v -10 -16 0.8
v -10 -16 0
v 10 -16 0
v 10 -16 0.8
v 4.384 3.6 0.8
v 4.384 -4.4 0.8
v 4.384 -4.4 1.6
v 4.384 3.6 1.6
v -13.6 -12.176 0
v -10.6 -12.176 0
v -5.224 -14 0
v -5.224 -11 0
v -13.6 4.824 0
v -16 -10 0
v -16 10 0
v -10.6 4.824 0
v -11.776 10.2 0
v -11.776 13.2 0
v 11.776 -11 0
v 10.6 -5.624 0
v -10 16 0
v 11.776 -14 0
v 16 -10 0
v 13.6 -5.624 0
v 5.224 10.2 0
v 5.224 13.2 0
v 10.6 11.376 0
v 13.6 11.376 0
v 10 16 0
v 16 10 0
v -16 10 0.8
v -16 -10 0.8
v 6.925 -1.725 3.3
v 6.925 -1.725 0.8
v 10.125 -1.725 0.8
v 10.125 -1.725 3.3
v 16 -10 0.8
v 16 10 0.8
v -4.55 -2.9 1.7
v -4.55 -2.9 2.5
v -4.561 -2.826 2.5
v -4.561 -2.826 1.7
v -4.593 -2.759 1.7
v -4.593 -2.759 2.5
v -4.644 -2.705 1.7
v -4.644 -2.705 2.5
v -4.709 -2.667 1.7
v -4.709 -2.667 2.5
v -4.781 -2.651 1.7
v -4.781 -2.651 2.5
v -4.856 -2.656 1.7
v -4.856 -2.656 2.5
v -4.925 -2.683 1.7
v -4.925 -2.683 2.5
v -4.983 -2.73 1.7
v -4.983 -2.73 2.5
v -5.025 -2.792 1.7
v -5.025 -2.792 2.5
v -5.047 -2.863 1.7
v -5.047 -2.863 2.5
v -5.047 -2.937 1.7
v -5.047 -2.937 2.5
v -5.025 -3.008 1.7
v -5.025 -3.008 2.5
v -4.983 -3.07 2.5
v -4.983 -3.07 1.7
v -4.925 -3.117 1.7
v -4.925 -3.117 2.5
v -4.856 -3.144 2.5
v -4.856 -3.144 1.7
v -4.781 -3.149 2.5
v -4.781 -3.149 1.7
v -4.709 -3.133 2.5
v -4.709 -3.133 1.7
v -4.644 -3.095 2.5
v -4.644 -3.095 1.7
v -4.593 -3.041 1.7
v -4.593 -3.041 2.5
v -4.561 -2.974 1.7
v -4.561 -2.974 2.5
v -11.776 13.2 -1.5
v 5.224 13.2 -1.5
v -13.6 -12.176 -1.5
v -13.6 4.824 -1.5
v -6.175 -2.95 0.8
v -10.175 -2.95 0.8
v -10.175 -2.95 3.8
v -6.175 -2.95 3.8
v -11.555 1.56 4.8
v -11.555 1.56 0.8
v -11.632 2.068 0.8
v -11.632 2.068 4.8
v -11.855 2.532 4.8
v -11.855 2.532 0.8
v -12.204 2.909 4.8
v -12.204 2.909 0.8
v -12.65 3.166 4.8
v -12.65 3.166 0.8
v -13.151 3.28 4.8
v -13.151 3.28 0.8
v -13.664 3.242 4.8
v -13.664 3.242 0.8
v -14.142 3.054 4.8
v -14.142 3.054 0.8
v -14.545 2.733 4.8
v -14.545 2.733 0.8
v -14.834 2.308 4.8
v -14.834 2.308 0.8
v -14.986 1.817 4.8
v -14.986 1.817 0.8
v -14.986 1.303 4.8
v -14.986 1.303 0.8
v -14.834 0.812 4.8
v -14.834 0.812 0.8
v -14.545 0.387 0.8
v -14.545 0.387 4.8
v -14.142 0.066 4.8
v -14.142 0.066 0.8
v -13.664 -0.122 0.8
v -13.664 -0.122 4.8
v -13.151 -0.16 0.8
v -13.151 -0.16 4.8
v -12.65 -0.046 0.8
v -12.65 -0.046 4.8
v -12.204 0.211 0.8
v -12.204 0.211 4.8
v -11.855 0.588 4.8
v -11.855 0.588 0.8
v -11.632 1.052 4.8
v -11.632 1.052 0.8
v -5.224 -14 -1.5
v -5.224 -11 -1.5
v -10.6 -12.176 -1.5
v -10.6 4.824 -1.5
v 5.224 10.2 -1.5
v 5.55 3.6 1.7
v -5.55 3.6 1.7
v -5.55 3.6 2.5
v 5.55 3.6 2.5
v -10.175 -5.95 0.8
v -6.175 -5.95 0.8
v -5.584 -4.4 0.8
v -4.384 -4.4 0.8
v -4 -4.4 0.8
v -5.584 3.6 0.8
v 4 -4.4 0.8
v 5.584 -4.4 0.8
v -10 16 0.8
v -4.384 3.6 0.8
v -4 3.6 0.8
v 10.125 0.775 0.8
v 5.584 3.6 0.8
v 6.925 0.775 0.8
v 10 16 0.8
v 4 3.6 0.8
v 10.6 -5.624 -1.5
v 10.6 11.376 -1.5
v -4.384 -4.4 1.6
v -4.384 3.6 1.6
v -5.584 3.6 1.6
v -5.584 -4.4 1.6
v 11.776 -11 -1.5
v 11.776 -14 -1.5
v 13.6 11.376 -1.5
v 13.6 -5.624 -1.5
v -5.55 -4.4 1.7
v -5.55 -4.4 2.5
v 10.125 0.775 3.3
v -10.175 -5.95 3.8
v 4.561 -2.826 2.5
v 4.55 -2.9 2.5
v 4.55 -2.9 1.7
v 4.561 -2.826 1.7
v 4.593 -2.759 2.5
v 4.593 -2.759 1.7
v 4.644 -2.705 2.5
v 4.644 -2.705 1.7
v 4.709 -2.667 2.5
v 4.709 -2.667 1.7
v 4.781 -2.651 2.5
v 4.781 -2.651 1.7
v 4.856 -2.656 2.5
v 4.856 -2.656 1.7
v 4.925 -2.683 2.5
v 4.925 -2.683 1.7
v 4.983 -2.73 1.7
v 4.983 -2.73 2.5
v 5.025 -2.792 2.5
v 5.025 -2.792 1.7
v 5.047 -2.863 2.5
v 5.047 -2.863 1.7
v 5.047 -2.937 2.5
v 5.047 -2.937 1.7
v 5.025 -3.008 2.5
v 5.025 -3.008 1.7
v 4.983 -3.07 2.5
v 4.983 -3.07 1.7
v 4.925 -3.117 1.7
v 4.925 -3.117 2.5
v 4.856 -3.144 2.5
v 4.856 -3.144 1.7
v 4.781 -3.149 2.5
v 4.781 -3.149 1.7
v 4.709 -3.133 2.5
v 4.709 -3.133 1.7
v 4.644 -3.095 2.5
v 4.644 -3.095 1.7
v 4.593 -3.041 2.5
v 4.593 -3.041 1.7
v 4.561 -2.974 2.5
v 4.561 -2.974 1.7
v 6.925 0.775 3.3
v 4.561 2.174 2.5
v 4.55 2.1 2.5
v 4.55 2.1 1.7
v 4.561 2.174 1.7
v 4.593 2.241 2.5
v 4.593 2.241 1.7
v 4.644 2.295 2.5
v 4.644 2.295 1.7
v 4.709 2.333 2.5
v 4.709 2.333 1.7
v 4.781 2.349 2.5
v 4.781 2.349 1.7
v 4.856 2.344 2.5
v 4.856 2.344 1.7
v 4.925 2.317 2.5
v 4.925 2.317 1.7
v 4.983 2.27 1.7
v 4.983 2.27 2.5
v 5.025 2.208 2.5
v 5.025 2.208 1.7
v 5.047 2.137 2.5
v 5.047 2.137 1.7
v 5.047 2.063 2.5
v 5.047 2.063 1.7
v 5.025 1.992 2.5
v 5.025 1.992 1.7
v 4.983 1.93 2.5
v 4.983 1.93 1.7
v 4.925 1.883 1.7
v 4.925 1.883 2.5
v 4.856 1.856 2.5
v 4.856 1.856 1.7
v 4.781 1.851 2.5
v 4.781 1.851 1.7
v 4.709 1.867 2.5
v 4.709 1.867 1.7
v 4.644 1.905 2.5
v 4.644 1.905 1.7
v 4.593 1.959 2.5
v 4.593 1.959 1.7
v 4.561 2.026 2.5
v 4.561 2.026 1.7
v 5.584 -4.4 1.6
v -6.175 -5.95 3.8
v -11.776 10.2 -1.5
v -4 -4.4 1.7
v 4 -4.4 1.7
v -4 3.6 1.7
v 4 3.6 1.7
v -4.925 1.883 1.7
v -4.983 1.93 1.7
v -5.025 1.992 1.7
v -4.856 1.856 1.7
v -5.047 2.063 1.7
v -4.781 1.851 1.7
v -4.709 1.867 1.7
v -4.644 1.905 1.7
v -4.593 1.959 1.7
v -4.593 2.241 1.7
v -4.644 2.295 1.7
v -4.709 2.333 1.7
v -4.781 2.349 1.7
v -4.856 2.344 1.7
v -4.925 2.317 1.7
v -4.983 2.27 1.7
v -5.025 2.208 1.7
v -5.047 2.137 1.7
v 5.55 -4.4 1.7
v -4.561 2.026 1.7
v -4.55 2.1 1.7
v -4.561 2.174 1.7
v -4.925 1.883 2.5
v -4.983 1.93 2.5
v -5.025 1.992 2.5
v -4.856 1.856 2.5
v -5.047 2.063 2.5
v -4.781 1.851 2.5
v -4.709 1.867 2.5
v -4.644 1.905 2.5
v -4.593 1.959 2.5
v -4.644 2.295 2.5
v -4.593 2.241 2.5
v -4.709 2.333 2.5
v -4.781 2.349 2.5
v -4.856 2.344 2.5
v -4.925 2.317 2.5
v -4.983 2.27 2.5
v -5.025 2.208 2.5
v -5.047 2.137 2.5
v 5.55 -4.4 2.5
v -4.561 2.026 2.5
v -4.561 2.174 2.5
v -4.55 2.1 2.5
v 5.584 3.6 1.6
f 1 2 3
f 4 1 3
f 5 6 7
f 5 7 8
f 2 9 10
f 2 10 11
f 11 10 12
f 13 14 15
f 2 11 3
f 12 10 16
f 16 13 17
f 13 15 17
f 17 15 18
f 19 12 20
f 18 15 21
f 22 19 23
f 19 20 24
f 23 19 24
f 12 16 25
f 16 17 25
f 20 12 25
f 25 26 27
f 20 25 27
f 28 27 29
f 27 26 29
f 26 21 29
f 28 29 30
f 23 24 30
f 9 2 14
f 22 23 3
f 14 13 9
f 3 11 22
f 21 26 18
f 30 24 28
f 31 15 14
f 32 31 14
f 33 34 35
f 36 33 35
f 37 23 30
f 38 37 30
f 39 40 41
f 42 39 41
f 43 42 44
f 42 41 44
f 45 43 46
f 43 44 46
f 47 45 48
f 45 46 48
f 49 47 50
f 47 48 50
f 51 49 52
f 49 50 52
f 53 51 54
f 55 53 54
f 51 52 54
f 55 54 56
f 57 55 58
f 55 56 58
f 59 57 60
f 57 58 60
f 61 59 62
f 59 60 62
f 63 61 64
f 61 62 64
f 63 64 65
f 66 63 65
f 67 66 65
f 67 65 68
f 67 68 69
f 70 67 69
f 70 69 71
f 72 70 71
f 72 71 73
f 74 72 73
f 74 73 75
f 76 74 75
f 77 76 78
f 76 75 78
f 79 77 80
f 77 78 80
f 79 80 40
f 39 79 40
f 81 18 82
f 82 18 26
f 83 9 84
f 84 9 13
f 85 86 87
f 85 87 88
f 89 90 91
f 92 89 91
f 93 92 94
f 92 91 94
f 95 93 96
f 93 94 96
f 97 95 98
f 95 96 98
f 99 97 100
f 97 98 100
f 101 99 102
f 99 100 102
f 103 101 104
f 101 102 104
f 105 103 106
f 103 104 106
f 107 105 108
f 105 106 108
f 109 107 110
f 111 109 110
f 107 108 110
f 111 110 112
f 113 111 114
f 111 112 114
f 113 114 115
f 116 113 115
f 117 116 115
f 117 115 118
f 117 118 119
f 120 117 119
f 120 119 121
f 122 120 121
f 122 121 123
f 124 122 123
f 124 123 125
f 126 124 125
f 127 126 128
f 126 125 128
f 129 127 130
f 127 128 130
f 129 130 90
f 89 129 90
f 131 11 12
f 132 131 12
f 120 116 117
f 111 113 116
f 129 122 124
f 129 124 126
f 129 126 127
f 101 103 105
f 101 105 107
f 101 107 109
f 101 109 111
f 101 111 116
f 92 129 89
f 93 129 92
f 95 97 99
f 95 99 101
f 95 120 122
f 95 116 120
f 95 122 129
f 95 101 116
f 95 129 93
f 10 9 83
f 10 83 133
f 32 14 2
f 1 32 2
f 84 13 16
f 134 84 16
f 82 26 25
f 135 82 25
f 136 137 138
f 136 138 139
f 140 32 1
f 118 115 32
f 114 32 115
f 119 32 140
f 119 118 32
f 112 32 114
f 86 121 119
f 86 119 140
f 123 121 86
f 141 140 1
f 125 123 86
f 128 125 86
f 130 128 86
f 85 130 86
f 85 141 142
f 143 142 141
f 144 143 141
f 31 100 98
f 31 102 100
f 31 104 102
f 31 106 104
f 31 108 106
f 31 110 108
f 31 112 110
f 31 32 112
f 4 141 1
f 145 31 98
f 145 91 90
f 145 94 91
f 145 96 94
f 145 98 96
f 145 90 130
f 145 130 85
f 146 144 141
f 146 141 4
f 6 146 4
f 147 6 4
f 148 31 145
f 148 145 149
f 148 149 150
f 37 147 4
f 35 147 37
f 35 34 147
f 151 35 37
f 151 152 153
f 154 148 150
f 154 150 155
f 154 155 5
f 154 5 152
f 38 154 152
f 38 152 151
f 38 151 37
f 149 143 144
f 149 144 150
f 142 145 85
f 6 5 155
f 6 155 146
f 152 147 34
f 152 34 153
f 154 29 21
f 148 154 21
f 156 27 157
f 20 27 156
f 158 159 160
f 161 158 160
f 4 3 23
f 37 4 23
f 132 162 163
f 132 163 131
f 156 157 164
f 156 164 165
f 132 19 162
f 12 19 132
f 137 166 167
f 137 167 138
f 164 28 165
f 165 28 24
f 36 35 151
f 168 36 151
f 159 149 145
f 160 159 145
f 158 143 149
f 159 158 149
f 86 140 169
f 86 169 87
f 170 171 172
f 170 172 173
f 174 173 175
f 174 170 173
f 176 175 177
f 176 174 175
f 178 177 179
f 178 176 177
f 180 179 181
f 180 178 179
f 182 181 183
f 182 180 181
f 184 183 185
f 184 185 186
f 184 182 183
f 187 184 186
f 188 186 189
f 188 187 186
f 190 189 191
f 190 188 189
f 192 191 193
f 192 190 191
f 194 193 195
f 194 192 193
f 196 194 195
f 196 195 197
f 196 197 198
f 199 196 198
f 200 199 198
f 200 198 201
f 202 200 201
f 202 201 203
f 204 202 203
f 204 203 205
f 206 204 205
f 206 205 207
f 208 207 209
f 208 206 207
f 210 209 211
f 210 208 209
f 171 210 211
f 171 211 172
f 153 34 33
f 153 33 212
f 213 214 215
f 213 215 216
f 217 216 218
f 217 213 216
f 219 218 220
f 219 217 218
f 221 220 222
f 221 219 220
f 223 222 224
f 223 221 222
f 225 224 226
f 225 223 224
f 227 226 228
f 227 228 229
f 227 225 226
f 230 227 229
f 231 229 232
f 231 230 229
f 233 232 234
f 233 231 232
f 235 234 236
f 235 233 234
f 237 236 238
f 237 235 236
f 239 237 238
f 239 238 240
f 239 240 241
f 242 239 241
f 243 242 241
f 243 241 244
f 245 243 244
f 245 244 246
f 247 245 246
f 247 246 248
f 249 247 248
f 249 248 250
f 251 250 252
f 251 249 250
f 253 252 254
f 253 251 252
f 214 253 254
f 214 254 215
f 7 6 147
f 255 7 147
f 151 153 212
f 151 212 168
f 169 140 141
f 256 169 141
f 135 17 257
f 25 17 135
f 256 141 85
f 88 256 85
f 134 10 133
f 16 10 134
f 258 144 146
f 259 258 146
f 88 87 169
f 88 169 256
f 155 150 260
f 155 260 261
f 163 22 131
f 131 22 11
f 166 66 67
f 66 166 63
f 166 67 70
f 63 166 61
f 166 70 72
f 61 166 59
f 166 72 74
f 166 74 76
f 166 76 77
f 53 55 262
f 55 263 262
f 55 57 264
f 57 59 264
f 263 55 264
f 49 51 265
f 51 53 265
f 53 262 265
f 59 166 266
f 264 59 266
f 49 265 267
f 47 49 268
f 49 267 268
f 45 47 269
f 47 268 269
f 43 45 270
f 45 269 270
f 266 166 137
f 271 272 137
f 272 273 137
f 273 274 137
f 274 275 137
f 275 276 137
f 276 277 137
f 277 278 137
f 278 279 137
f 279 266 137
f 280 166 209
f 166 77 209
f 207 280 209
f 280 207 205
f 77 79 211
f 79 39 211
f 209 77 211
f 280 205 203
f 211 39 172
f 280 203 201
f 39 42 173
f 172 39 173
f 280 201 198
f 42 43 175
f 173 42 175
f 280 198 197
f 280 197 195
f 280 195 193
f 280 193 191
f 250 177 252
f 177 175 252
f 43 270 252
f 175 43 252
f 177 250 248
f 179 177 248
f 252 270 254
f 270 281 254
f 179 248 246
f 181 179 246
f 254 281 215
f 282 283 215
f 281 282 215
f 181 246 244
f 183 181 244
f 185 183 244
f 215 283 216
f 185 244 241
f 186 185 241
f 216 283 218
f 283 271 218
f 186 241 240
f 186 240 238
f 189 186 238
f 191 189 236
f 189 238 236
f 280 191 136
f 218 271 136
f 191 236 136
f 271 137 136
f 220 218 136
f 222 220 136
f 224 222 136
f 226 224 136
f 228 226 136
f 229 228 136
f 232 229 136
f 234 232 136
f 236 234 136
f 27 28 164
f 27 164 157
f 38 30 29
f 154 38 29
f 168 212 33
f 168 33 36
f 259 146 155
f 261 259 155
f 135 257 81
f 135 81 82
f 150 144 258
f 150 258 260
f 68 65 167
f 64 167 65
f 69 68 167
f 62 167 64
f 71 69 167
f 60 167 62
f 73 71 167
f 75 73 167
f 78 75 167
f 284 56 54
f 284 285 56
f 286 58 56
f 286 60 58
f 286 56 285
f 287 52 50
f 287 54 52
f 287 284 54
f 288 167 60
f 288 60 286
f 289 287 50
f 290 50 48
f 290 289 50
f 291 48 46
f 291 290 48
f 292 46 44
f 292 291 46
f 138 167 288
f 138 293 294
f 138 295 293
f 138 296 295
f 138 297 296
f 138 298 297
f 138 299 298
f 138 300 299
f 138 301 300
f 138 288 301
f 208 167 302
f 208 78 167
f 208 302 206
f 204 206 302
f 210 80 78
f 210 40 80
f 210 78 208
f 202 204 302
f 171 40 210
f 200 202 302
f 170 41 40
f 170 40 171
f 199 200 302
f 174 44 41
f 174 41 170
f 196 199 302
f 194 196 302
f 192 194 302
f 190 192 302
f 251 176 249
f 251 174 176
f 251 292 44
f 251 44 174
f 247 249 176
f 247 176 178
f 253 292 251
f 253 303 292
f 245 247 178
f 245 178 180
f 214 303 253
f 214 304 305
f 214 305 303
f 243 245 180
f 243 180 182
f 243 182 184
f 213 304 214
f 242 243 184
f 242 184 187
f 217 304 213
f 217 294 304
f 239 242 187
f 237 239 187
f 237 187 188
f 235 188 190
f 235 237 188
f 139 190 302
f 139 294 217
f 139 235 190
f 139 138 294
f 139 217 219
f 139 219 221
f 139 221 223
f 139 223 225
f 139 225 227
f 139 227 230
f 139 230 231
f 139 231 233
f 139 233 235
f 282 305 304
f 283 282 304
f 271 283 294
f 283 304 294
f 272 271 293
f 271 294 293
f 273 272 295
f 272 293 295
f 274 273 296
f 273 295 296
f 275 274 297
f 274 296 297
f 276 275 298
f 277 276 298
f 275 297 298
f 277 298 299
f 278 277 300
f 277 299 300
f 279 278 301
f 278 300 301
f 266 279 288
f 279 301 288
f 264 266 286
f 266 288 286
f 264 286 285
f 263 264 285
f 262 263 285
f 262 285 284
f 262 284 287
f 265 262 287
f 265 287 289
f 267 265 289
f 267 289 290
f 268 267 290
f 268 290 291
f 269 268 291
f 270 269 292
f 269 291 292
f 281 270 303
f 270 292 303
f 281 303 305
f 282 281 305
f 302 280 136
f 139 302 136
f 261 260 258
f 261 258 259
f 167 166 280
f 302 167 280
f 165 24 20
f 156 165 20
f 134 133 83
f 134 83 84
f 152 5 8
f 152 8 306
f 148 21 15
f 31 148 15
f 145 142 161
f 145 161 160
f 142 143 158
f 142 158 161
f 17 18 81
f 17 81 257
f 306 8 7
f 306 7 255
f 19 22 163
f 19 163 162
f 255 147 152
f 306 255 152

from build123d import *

# Parameters (mm, degrees)
BOSS_EXTRUDE1_DEPTH  = 0.8
SKETCH2_W            = 17
SKETCH2_H            = 3
BOSS_EXTRUDE2_DEPTH  = 1.5
SKETCH3_W            = 8
SKETCH3_H            = 8
BOSS_EXTRUDE3_DEPTH  = 0.9
CIRPATTERN2_COUNT    = 4
SKETCH5_W            = 1.2
SKETCH5_H            = 8
BOSS_EXTRUDE4_DEPTH  = 0.8
SKETCH6_W            = 11.1
SKETCH6_H            = 8
BOSS_EXTRUDE5_DEPTH  = 0.8
SKETCH10_W           = 3.2
SKETCH10_H           = 2.5
BOSS_EXTRUDE7_DEPTH  = 2.5
SKETCH11_W           = 4
SKETCH11_H           = 3
BOSS_EXTRUDE8_DEPTH  = 3
SKETCH12_R           = 1.725
BOSS_EXTRUDE10_DEPTH = 4
SKETCH14_R           = 0.25
CUT_EXTRUDE1_DEPTH   = 0.8


with BuildPart() as part:
    # Sketch1 → Boss-Extrude1 (new body)
    with BuildSketch(Plane.XY):
        Polygon((-10, 16), (-16, 10), (-16, -10), (-10, -16), (10, -16), (16, -10), (16, 10), (10, 16), align=None)
    extrude(amount=BOSS_EXTRUDE1_DEPTH)

    # Sketch2 → Boss-Extrude2 (add)
    with BuildSketch(Plane(origin=(0, 0, 0), x_dir=(-1, 0, 0), z_dir=(0, 0, -1))):
        with Locations((-3.275675651, -12.5)):
            Rectangle(SKETCH2_W, SKETCH2_H)
    boss_extrude2 = extrude(amount=BOSS_EXTRUDE2_DEPTH)

    # Sketch3 → Boss-Extrude3 (add)
    with BuildSketch(Plane.XY.offset(0.8)):
        with Locations((0, -0.4)):
            Rectangle(SKETCH3_W, SKETCH3_H)
    extrude(amount=BOSS_EXTRUDE3_DEPTH)

    # CirPattern2: Boss-Extrude2 ×4 about axis
    cirpattern2_axis = Axis((0, -0.4, 0), (0, 0, 1))
    for i in range(1, CIRPATTERN2_COUNT):
        add(boss_extrude2.rotate(cirpattern2_axis, i * 360 / CIRPATTERN2_COUNT))

    # Sketch5 → Boss-Extrude4 (add)
    with BuildSketch(Plane.XY.offset(0.8)):
        with Locations((4.983974318, -0.4)):
            Rectangle(SKETCH5_W, SKETCH5_H)
    boss_extrude4 = extrude(amount=BOSS_EXTRUDE4_DEPTH)

    # Mirror1: Boss-Extrude4 across plane
    add(boss_extrude4.mirror(Plane(origin=(0, 0, 0), x_dir=(0, 0, 1), z_dir=(1, 0, 0))))

    # Sketch10 → Boss-Extrude7 (add)
    with BuildSketch(Plane.XY.offset(0.8)):
        with Locations((8.525, -0.475)):
            Rectangle(SKETCH10_W, SKETCH10_H)
    extrude(amount=BOSS_EXTRUDE7_DEPTH)

    # Sketch11 → Boss-Extrude8 (add)
    with BuildSketch(Plane.XY.offset(0.8)):
        with Locations((-8.175, -4.45)):
            Rectangle(SKETCH11_W, SKETCH11_H)
    extrude(amount=BOSS_EXTRUDE8_DEPTH)

    # Sketch12 → Boss-Extrude10 (add)
    with BuildSketch(Plane.XY.offset(0.8)):
        with Locations((-13.28, 1.56)):
            Circle(SKETCH12_R)
    extrude(amount=BOSS_EXTRUDE10_DEPTH)


with BuildPart() as body_2:
    # Sketch6 → Boss-Extrude5 (new body)
    with BuildSketch(Plane.XY.offset(1.7)):
        with Locations((0, -0.4)):
            Rectangle(SKETCH6_W, SKETCH6_H)
    extrude(amount=BOSS_EXTRUDE5_DEPTH)

    # Sketch14 → Cut-Extrude1 (cut)
    with BuildSketch(Plane.XY.offset(2.5)):
        with Locations((-4.8, 2.1)):
            Circle(SKETCH14_R)
        with Locations((-4.8, -2.9)):
            Circle(SKETCH14_R)
    cut_extrude1 = extrude(amount=-CUT_EXTRUDE1_DEPTH, mode=Mode.SUBTRACT)

    # Mirror2: Cut-Extrude1 across plane
    add(cut_extrude1.mirror(Plane(origin=(0, 0, 0), x_dir=(0, 0, 1), z_dir=(1, 0, 0))), mode=Mode.SUBTRACT)


solid = Compound([part.part, body_2.part])
